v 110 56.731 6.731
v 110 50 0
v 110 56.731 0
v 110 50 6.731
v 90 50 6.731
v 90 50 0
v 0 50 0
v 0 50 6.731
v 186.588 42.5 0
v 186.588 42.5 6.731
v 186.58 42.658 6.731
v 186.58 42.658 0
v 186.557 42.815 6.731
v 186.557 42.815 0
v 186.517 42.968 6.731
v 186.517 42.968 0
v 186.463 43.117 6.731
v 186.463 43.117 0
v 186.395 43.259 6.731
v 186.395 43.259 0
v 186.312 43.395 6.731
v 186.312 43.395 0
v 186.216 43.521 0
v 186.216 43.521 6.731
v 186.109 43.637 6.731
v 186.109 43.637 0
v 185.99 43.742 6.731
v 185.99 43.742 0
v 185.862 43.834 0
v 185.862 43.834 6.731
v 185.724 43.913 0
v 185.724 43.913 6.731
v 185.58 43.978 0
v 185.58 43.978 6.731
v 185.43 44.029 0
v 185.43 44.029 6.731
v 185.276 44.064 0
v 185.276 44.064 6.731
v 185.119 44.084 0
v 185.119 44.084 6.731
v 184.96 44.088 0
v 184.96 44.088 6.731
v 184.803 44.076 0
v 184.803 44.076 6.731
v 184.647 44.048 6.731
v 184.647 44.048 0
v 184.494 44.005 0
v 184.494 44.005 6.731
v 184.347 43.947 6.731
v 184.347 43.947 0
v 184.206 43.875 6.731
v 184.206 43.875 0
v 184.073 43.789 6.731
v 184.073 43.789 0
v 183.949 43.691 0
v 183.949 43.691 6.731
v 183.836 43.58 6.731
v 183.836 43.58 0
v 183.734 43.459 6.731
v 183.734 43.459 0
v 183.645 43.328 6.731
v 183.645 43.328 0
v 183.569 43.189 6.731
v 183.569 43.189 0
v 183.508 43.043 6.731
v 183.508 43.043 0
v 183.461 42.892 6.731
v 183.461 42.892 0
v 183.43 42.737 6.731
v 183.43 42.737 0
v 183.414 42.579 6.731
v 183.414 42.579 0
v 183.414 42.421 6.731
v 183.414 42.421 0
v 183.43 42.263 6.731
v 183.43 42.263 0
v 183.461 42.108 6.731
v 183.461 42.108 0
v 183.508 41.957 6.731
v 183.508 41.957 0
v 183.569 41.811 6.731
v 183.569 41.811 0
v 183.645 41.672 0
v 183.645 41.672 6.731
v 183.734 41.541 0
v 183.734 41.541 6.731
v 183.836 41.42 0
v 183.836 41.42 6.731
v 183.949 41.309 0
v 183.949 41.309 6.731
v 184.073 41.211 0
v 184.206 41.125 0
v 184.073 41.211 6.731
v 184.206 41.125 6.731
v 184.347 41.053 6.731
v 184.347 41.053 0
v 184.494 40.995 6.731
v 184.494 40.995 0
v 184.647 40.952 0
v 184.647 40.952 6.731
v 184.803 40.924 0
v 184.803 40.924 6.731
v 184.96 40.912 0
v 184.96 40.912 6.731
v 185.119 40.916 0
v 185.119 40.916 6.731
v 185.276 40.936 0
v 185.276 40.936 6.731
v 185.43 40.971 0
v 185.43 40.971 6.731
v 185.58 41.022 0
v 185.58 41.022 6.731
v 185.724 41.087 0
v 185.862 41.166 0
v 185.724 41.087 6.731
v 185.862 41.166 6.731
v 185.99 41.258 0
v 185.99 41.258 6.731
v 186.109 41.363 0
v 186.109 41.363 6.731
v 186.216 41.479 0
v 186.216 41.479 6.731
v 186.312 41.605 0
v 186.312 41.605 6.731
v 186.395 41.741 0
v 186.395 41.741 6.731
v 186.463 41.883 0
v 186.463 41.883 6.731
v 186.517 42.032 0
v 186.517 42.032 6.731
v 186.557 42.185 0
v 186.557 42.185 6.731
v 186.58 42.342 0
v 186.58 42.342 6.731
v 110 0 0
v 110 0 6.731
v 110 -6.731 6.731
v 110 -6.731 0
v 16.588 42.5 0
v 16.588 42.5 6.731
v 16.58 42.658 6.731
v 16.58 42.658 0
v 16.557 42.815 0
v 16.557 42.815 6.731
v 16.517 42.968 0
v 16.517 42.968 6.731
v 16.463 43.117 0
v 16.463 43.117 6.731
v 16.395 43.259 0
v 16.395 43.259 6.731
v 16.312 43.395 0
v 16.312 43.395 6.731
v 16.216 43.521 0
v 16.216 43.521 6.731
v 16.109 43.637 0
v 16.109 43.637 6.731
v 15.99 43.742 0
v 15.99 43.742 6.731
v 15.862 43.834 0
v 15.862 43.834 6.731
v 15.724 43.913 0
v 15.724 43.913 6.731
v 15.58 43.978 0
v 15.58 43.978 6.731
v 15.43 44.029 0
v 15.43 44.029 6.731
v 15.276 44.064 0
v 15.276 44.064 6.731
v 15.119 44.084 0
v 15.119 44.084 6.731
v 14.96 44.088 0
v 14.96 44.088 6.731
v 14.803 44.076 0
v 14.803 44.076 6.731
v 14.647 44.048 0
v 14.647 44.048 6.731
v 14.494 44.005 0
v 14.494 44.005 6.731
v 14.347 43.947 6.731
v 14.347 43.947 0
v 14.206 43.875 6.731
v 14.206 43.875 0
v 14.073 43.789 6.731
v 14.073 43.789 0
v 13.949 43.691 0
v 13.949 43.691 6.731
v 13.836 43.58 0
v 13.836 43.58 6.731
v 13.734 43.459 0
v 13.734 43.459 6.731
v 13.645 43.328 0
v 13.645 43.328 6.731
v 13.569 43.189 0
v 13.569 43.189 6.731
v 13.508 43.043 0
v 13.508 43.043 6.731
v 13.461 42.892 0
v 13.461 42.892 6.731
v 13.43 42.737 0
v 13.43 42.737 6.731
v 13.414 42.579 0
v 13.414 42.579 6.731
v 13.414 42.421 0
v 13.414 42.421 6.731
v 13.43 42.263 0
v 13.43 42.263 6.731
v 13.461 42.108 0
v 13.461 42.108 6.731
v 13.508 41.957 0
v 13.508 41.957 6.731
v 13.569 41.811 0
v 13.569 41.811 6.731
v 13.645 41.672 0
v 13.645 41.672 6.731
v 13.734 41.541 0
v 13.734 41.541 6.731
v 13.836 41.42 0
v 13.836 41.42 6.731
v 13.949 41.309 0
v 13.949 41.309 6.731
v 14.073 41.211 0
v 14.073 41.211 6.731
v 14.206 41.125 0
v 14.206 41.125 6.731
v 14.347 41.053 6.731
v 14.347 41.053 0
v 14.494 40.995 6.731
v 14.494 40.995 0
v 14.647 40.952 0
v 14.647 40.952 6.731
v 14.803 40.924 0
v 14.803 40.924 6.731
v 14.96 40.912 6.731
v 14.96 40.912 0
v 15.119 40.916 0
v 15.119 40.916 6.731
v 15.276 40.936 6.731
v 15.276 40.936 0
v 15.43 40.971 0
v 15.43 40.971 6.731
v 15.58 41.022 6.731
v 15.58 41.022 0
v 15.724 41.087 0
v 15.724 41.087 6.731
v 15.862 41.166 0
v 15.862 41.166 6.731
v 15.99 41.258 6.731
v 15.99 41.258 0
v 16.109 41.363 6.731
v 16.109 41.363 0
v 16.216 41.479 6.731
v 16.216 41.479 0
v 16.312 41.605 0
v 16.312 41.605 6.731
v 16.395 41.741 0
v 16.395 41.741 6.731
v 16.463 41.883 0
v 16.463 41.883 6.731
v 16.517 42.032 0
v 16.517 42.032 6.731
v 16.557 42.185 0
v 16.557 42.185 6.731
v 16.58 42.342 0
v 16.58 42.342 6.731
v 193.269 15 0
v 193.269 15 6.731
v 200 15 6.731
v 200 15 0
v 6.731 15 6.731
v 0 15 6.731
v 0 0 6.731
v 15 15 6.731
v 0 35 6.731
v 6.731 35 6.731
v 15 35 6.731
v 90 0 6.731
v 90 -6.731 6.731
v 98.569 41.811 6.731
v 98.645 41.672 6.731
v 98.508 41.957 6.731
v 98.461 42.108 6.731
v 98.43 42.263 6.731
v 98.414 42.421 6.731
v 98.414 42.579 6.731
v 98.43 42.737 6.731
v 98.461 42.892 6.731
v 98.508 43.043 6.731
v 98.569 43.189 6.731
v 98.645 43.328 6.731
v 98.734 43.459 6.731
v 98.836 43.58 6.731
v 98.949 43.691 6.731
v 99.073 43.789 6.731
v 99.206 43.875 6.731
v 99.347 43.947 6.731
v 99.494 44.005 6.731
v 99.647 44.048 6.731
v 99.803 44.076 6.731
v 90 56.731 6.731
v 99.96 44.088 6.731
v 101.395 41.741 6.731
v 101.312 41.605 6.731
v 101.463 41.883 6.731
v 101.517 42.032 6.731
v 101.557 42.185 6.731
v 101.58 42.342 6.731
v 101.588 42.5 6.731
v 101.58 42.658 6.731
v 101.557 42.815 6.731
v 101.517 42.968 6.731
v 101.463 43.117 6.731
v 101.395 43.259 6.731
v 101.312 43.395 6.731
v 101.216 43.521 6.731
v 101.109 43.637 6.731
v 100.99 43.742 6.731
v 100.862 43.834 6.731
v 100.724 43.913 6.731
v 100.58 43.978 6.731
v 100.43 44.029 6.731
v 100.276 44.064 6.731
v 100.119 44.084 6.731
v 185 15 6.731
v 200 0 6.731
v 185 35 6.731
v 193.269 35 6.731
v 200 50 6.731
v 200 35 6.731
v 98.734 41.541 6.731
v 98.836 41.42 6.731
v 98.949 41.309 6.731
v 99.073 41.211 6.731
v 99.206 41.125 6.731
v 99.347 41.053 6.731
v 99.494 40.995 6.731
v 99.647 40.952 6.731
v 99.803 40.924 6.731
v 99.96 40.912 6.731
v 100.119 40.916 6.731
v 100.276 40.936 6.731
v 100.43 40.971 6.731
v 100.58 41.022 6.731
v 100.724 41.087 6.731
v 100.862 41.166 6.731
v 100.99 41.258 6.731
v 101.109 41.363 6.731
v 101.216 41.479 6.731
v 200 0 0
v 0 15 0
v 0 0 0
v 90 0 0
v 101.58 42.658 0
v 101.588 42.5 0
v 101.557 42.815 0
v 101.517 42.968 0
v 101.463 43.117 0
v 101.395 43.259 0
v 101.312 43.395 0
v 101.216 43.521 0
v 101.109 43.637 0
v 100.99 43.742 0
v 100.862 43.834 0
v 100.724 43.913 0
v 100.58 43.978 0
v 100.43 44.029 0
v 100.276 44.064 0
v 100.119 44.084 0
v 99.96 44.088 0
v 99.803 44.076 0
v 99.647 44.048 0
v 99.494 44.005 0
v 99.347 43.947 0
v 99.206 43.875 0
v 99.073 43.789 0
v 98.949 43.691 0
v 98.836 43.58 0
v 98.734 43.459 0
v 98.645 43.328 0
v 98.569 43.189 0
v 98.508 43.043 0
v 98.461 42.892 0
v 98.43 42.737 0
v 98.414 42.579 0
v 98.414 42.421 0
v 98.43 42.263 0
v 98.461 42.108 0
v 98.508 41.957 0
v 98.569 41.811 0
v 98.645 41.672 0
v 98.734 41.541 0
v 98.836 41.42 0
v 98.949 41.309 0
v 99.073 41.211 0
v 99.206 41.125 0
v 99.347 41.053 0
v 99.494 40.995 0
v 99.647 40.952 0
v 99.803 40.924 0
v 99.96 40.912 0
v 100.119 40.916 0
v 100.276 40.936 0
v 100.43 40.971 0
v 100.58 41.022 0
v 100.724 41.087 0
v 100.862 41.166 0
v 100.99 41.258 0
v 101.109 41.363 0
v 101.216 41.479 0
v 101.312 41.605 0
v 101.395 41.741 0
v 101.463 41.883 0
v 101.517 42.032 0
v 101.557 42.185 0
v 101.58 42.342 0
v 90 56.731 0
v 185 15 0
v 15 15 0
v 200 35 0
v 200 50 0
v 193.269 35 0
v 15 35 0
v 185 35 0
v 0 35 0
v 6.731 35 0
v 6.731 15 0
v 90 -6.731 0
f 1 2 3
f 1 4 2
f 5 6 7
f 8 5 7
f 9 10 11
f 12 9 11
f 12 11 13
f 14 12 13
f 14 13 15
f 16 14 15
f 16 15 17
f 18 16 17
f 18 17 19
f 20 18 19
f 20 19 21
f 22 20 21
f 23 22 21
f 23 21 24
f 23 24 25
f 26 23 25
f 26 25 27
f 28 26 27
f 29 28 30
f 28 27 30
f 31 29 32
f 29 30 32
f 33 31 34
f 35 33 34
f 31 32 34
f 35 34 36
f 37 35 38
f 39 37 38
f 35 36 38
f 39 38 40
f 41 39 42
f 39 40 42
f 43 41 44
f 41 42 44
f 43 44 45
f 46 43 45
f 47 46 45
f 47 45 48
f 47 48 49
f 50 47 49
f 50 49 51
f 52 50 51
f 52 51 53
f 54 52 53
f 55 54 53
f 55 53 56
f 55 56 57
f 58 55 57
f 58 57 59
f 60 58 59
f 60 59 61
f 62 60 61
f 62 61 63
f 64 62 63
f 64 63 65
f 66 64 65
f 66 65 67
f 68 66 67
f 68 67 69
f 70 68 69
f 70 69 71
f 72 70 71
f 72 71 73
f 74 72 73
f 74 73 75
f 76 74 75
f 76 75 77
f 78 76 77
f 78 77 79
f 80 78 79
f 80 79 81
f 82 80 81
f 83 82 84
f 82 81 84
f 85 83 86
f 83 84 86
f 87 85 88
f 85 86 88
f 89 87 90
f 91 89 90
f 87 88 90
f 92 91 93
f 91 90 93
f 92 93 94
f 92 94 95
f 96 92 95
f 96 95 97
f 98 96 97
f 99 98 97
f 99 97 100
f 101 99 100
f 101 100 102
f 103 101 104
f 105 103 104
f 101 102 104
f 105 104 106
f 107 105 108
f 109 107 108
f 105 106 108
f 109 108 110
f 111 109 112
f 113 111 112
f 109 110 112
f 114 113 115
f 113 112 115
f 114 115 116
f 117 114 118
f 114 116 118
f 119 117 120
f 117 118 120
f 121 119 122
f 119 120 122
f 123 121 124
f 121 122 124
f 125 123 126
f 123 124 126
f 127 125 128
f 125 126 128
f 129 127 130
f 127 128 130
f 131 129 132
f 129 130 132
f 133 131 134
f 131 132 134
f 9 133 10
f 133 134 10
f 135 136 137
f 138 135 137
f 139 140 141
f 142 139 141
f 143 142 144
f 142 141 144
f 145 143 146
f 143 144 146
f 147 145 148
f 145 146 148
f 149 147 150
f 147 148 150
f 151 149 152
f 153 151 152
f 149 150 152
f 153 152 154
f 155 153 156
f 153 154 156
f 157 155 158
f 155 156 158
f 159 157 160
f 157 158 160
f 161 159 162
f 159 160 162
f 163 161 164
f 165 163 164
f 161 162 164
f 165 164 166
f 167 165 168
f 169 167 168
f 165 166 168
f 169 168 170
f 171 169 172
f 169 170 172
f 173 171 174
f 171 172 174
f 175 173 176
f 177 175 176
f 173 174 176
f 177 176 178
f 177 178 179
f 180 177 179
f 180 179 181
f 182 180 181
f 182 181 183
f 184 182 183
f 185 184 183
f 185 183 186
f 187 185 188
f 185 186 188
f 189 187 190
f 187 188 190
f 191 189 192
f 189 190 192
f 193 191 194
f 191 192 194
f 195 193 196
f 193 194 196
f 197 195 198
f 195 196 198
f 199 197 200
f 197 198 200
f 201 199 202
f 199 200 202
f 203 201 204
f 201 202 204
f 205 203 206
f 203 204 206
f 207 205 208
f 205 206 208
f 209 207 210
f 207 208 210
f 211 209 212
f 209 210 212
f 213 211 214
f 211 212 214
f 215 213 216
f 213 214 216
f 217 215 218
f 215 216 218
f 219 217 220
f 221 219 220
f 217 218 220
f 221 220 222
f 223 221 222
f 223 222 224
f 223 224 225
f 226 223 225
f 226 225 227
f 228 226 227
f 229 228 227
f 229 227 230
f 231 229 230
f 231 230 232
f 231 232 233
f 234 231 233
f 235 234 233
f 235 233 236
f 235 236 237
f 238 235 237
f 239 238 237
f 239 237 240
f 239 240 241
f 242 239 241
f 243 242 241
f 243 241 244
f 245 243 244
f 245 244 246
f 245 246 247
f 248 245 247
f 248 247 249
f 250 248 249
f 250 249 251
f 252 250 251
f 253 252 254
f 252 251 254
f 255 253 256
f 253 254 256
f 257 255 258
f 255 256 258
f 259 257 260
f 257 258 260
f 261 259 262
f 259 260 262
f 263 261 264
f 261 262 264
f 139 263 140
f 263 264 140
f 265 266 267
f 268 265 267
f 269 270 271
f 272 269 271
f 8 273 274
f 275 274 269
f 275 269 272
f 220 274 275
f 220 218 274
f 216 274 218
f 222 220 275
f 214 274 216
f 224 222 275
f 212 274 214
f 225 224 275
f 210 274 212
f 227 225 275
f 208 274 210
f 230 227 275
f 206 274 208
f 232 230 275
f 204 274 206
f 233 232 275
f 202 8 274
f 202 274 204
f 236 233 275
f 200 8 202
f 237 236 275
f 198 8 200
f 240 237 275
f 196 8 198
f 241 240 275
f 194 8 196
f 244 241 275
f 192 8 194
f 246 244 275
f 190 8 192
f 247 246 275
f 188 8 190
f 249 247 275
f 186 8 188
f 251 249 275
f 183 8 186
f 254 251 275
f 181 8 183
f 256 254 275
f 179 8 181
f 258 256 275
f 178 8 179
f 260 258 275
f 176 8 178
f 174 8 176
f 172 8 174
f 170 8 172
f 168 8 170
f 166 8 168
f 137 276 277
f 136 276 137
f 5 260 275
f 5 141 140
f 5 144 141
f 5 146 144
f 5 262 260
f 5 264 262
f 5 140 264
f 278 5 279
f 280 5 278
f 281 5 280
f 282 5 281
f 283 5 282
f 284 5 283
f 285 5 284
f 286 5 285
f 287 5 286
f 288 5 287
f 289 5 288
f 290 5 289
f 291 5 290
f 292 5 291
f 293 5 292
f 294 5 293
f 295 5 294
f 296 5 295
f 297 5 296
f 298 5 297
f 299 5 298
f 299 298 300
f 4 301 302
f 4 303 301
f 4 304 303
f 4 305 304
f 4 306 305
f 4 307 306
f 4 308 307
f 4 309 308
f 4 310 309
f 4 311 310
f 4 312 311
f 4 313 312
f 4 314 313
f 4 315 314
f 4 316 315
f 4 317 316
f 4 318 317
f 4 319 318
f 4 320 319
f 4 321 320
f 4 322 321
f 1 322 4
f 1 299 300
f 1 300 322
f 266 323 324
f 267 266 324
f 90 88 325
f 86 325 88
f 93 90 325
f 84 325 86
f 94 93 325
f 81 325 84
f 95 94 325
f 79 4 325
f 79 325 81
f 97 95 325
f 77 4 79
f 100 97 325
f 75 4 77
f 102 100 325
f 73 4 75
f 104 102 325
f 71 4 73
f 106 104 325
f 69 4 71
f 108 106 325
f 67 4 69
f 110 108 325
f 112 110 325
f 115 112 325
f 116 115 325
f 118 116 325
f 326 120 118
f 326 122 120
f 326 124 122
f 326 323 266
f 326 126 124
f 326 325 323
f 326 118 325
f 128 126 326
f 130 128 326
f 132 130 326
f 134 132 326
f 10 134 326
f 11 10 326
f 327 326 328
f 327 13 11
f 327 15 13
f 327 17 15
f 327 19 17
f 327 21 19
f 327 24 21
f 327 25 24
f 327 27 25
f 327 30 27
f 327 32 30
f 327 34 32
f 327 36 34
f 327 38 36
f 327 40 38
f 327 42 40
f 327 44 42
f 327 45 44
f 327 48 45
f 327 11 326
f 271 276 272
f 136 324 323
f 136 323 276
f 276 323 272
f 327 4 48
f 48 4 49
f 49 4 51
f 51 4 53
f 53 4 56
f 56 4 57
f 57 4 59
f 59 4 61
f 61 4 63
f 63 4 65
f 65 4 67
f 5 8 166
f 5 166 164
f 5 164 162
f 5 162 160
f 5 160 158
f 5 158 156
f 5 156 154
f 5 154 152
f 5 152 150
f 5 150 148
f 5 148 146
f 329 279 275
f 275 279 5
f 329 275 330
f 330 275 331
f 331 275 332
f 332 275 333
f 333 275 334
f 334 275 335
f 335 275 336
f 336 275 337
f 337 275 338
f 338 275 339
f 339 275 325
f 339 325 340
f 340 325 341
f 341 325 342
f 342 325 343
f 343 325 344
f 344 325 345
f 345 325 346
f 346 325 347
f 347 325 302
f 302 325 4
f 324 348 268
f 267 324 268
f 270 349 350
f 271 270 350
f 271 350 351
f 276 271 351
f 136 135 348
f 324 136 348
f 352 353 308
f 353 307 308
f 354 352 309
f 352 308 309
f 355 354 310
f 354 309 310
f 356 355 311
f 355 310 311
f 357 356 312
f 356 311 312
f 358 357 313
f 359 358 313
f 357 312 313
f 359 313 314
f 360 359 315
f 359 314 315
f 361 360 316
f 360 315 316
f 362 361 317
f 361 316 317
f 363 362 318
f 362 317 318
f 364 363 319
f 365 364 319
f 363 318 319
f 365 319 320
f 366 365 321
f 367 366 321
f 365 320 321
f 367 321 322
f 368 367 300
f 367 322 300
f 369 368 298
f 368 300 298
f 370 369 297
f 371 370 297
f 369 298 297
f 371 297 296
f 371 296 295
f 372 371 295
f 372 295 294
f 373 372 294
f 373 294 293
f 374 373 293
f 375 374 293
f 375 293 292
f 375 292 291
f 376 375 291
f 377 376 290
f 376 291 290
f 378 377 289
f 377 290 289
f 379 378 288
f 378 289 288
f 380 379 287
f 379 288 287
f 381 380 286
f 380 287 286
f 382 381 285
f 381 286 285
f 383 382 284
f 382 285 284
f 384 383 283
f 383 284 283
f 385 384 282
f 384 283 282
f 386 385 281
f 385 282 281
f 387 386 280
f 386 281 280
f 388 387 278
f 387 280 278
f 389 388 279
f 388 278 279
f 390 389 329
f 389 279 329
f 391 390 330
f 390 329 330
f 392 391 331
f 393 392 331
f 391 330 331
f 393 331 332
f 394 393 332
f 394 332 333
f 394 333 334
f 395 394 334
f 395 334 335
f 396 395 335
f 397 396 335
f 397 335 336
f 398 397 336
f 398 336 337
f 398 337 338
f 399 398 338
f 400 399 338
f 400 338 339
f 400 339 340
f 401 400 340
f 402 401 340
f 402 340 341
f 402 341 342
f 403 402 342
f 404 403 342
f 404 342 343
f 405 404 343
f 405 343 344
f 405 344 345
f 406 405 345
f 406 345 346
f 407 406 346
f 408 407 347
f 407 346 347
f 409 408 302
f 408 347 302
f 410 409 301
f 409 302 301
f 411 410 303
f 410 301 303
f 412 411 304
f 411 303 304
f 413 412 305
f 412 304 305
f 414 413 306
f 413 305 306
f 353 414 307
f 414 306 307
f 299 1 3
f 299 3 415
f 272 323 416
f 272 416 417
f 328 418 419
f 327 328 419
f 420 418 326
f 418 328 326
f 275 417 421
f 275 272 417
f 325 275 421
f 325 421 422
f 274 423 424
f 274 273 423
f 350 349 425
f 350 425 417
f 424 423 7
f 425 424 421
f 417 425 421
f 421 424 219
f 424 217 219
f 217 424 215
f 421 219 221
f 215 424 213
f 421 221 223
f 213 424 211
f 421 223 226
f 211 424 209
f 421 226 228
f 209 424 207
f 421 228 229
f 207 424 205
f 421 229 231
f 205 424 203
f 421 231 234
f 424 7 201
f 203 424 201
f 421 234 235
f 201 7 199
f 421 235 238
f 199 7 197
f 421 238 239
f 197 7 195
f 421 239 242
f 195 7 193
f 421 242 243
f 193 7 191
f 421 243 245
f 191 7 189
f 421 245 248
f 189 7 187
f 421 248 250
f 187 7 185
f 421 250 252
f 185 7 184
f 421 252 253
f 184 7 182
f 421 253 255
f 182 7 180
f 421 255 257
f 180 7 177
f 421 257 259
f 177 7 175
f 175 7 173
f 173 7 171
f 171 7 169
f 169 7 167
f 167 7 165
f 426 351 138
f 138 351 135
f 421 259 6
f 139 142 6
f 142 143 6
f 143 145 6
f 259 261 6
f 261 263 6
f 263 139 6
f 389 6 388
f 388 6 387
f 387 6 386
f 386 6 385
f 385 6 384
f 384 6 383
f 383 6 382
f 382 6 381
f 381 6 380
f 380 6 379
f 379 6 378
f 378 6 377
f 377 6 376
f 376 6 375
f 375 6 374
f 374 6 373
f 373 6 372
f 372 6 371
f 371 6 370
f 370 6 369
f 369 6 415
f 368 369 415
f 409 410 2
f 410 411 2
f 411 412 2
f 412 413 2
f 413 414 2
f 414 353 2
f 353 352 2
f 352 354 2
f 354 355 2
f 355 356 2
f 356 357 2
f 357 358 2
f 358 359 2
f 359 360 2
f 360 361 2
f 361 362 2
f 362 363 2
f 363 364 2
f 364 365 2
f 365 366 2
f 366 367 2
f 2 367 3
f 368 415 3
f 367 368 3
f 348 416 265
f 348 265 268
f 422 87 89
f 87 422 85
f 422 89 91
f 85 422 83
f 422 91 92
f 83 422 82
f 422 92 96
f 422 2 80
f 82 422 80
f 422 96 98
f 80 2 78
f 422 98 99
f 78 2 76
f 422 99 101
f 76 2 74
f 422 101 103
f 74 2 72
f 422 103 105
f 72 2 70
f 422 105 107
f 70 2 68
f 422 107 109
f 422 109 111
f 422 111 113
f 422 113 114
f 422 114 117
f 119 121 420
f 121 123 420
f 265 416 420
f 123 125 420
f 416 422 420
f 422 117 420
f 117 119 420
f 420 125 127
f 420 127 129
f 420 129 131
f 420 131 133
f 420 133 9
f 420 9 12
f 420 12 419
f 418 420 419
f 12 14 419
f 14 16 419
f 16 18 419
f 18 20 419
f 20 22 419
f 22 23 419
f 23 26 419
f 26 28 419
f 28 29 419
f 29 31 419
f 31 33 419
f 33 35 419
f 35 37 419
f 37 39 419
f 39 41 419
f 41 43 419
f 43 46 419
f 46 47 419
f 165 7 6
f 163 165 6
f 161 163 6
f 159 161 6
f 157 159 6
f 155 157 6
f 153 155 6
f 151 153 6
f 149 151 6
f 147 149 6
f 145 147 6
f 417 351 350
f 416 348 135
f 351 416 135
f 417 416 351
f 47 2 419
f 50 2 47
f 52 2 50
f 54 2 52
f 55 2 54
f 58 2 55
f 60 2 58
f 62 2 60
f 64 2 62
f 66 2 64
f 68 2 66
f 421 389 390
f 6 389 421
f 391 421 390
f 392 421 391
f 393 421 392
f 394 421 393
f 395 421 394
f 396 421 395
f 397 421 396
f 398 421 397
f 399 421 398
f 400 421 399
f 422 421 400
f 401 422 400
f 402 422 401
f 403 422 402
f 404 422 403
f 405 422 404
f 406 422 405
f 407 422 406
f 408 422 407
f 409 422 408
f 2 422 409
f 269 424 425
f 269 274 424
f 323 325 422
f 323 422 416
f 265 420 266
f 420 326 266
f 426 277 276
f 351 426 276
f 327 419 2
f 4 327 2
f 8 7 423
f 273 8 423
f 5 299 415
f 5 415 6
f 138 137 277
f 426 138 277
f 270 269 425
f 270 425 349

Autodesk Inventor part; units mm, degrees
ref_plane "YZ Plane" through (0, 0, 0) normal (1, 0, 0) x (0, 1, 0)
ref_plane "XZ Plane" through (0, 0, 0) normal (0, 1, 0) x (-1, 0, 0)
ref_plane "XY Plane" through (0, 0, 0) normal (0, 0, 1) x (1, 0, 0)
sketch "Sketch1" plane through (0, 0, 0) normal (0, 0, 1) x (1, 0, 0)
  line L0 (0, 0) -> (200, 0)
  line L1 (200, 0) -> (200, 50)
  line L2 (200, 50) -> (0, 50)
  line L3 (0, 50) -> (0, 0)
  dimension "d0" = 200
  dimension "d1" = 50
extrude "Extrusion1" add sketch "Sketch1" along normal blind 6.731
sketch "Sketch2" plane through (0, 0, 6.731) normal (0, 0, 1) x (1, 0, 0)
  line L0 (200, 50) -> (0, 50) projected
  line L1 (0, 50) -> (0, 0) projected
  line L2 (185, 15) -> (15, 15)
  line L3 (15, 15) -> (15, 35)
  line L4 (15, 35) -> (185, 35)
  line L5 (185, 35) -> (185, 15)
  circle A0 centre (15, 42.5) radius 1.588
  circle A1 centre (185, 42.5) radius 1.588
  circle A2 centre (100, 42.5) radius 1.588
  point P0 (100, 35)
  point P1 (100, 50)
  point P2 (15, 25)
  point P3 (0, 25)
  point P4 (0, 25)
  dimension "d4" = 20
  dimension "d6" = 15
  dimension "d15" = 3.176
  dimension "d18" = 50
  dimension "d23" = 7.5
extrude "Cutout" cut sketch "Sketch2" against normal up to next
sketch "Sketch3" plane through (0, 0, 6.731) normal (0, 0, 1) x (1, 0, 0)
  line L0 (200, 0) -> (200, 50) projected
  line L1 (0, 50) -> (0, 0) projected
  line L2 (0, 35) -> (6.731, 35)
  line L3 (6.731, 35) -> (6.731, 15)
  line L4 (6.731, 15) -> (0, 15)
  line L5 (0, 15) -> (0, 35)
  line L6 (200, 35) -> (193.269, 35)
  line L7 (193.269, 35) -> (193.269, 15)
  line L8 (193.269, 15) -> (200, 15)
  line L9 (200, 15) -> (200, 35)
  point P0 (193.269, 25)
  point P1 (200, 25)
  dimension "d9" = 20
  dimension "d10" = 6.731
extrude "Tabs Neg" cut sketch "Sketch3" against normal up to next
sketch "Sketch4" plane through (0, 0, 6.731) normal (0, 0, 1) x (1, 0, 0)
  line L0 (6.731, 35) -> (6.731, 15) projected
  line L1 (6.731, 15) -> (0, 15) projected
  line L2 (0, 0) -> (200, 0) projected
  line L3 (90, 0) -> (110, 0)
  line L4 (110, 0) -> (110, -6.731)
  line L5 (110, -6.731) -> (90, -6.731)
  line L6 (90, -6.731) -> (90, 0)
  line L7 (200, 50) -> (0, 50) projected
  line L8 (90, 50) -> (110, 50)
  line L9 (110, 50) -> (110, 56.731)
  line L10 (110, 56.731) -> (90, 56.731)
  line L11 (90, 56.731) -> (90, 50)
  point P0 (100, -6.731)
  point P1 (100, 0)
extrude "Tabs Pos" add sketch "Sketch4" against normal blind 6.731
equation "\"d2\" = THICKB"
equation "\"d7\" = THICKB"
equation "\"d10\" = THICKB"
equation "\"d11\" = THICKB"
equation "\"d13\" = THICKB"
equation "\"THICKA\" = 3.175"
equation "\"THICKB\" = 6.731"
equation "\"THICKC\" = 12.7"
equation "\"THICKPLY\" = 5"
equation "\"MAGDIA\" = 9.5"
equation "\"BALLDIA\" = 12"
properties part number "Controller_Back"
